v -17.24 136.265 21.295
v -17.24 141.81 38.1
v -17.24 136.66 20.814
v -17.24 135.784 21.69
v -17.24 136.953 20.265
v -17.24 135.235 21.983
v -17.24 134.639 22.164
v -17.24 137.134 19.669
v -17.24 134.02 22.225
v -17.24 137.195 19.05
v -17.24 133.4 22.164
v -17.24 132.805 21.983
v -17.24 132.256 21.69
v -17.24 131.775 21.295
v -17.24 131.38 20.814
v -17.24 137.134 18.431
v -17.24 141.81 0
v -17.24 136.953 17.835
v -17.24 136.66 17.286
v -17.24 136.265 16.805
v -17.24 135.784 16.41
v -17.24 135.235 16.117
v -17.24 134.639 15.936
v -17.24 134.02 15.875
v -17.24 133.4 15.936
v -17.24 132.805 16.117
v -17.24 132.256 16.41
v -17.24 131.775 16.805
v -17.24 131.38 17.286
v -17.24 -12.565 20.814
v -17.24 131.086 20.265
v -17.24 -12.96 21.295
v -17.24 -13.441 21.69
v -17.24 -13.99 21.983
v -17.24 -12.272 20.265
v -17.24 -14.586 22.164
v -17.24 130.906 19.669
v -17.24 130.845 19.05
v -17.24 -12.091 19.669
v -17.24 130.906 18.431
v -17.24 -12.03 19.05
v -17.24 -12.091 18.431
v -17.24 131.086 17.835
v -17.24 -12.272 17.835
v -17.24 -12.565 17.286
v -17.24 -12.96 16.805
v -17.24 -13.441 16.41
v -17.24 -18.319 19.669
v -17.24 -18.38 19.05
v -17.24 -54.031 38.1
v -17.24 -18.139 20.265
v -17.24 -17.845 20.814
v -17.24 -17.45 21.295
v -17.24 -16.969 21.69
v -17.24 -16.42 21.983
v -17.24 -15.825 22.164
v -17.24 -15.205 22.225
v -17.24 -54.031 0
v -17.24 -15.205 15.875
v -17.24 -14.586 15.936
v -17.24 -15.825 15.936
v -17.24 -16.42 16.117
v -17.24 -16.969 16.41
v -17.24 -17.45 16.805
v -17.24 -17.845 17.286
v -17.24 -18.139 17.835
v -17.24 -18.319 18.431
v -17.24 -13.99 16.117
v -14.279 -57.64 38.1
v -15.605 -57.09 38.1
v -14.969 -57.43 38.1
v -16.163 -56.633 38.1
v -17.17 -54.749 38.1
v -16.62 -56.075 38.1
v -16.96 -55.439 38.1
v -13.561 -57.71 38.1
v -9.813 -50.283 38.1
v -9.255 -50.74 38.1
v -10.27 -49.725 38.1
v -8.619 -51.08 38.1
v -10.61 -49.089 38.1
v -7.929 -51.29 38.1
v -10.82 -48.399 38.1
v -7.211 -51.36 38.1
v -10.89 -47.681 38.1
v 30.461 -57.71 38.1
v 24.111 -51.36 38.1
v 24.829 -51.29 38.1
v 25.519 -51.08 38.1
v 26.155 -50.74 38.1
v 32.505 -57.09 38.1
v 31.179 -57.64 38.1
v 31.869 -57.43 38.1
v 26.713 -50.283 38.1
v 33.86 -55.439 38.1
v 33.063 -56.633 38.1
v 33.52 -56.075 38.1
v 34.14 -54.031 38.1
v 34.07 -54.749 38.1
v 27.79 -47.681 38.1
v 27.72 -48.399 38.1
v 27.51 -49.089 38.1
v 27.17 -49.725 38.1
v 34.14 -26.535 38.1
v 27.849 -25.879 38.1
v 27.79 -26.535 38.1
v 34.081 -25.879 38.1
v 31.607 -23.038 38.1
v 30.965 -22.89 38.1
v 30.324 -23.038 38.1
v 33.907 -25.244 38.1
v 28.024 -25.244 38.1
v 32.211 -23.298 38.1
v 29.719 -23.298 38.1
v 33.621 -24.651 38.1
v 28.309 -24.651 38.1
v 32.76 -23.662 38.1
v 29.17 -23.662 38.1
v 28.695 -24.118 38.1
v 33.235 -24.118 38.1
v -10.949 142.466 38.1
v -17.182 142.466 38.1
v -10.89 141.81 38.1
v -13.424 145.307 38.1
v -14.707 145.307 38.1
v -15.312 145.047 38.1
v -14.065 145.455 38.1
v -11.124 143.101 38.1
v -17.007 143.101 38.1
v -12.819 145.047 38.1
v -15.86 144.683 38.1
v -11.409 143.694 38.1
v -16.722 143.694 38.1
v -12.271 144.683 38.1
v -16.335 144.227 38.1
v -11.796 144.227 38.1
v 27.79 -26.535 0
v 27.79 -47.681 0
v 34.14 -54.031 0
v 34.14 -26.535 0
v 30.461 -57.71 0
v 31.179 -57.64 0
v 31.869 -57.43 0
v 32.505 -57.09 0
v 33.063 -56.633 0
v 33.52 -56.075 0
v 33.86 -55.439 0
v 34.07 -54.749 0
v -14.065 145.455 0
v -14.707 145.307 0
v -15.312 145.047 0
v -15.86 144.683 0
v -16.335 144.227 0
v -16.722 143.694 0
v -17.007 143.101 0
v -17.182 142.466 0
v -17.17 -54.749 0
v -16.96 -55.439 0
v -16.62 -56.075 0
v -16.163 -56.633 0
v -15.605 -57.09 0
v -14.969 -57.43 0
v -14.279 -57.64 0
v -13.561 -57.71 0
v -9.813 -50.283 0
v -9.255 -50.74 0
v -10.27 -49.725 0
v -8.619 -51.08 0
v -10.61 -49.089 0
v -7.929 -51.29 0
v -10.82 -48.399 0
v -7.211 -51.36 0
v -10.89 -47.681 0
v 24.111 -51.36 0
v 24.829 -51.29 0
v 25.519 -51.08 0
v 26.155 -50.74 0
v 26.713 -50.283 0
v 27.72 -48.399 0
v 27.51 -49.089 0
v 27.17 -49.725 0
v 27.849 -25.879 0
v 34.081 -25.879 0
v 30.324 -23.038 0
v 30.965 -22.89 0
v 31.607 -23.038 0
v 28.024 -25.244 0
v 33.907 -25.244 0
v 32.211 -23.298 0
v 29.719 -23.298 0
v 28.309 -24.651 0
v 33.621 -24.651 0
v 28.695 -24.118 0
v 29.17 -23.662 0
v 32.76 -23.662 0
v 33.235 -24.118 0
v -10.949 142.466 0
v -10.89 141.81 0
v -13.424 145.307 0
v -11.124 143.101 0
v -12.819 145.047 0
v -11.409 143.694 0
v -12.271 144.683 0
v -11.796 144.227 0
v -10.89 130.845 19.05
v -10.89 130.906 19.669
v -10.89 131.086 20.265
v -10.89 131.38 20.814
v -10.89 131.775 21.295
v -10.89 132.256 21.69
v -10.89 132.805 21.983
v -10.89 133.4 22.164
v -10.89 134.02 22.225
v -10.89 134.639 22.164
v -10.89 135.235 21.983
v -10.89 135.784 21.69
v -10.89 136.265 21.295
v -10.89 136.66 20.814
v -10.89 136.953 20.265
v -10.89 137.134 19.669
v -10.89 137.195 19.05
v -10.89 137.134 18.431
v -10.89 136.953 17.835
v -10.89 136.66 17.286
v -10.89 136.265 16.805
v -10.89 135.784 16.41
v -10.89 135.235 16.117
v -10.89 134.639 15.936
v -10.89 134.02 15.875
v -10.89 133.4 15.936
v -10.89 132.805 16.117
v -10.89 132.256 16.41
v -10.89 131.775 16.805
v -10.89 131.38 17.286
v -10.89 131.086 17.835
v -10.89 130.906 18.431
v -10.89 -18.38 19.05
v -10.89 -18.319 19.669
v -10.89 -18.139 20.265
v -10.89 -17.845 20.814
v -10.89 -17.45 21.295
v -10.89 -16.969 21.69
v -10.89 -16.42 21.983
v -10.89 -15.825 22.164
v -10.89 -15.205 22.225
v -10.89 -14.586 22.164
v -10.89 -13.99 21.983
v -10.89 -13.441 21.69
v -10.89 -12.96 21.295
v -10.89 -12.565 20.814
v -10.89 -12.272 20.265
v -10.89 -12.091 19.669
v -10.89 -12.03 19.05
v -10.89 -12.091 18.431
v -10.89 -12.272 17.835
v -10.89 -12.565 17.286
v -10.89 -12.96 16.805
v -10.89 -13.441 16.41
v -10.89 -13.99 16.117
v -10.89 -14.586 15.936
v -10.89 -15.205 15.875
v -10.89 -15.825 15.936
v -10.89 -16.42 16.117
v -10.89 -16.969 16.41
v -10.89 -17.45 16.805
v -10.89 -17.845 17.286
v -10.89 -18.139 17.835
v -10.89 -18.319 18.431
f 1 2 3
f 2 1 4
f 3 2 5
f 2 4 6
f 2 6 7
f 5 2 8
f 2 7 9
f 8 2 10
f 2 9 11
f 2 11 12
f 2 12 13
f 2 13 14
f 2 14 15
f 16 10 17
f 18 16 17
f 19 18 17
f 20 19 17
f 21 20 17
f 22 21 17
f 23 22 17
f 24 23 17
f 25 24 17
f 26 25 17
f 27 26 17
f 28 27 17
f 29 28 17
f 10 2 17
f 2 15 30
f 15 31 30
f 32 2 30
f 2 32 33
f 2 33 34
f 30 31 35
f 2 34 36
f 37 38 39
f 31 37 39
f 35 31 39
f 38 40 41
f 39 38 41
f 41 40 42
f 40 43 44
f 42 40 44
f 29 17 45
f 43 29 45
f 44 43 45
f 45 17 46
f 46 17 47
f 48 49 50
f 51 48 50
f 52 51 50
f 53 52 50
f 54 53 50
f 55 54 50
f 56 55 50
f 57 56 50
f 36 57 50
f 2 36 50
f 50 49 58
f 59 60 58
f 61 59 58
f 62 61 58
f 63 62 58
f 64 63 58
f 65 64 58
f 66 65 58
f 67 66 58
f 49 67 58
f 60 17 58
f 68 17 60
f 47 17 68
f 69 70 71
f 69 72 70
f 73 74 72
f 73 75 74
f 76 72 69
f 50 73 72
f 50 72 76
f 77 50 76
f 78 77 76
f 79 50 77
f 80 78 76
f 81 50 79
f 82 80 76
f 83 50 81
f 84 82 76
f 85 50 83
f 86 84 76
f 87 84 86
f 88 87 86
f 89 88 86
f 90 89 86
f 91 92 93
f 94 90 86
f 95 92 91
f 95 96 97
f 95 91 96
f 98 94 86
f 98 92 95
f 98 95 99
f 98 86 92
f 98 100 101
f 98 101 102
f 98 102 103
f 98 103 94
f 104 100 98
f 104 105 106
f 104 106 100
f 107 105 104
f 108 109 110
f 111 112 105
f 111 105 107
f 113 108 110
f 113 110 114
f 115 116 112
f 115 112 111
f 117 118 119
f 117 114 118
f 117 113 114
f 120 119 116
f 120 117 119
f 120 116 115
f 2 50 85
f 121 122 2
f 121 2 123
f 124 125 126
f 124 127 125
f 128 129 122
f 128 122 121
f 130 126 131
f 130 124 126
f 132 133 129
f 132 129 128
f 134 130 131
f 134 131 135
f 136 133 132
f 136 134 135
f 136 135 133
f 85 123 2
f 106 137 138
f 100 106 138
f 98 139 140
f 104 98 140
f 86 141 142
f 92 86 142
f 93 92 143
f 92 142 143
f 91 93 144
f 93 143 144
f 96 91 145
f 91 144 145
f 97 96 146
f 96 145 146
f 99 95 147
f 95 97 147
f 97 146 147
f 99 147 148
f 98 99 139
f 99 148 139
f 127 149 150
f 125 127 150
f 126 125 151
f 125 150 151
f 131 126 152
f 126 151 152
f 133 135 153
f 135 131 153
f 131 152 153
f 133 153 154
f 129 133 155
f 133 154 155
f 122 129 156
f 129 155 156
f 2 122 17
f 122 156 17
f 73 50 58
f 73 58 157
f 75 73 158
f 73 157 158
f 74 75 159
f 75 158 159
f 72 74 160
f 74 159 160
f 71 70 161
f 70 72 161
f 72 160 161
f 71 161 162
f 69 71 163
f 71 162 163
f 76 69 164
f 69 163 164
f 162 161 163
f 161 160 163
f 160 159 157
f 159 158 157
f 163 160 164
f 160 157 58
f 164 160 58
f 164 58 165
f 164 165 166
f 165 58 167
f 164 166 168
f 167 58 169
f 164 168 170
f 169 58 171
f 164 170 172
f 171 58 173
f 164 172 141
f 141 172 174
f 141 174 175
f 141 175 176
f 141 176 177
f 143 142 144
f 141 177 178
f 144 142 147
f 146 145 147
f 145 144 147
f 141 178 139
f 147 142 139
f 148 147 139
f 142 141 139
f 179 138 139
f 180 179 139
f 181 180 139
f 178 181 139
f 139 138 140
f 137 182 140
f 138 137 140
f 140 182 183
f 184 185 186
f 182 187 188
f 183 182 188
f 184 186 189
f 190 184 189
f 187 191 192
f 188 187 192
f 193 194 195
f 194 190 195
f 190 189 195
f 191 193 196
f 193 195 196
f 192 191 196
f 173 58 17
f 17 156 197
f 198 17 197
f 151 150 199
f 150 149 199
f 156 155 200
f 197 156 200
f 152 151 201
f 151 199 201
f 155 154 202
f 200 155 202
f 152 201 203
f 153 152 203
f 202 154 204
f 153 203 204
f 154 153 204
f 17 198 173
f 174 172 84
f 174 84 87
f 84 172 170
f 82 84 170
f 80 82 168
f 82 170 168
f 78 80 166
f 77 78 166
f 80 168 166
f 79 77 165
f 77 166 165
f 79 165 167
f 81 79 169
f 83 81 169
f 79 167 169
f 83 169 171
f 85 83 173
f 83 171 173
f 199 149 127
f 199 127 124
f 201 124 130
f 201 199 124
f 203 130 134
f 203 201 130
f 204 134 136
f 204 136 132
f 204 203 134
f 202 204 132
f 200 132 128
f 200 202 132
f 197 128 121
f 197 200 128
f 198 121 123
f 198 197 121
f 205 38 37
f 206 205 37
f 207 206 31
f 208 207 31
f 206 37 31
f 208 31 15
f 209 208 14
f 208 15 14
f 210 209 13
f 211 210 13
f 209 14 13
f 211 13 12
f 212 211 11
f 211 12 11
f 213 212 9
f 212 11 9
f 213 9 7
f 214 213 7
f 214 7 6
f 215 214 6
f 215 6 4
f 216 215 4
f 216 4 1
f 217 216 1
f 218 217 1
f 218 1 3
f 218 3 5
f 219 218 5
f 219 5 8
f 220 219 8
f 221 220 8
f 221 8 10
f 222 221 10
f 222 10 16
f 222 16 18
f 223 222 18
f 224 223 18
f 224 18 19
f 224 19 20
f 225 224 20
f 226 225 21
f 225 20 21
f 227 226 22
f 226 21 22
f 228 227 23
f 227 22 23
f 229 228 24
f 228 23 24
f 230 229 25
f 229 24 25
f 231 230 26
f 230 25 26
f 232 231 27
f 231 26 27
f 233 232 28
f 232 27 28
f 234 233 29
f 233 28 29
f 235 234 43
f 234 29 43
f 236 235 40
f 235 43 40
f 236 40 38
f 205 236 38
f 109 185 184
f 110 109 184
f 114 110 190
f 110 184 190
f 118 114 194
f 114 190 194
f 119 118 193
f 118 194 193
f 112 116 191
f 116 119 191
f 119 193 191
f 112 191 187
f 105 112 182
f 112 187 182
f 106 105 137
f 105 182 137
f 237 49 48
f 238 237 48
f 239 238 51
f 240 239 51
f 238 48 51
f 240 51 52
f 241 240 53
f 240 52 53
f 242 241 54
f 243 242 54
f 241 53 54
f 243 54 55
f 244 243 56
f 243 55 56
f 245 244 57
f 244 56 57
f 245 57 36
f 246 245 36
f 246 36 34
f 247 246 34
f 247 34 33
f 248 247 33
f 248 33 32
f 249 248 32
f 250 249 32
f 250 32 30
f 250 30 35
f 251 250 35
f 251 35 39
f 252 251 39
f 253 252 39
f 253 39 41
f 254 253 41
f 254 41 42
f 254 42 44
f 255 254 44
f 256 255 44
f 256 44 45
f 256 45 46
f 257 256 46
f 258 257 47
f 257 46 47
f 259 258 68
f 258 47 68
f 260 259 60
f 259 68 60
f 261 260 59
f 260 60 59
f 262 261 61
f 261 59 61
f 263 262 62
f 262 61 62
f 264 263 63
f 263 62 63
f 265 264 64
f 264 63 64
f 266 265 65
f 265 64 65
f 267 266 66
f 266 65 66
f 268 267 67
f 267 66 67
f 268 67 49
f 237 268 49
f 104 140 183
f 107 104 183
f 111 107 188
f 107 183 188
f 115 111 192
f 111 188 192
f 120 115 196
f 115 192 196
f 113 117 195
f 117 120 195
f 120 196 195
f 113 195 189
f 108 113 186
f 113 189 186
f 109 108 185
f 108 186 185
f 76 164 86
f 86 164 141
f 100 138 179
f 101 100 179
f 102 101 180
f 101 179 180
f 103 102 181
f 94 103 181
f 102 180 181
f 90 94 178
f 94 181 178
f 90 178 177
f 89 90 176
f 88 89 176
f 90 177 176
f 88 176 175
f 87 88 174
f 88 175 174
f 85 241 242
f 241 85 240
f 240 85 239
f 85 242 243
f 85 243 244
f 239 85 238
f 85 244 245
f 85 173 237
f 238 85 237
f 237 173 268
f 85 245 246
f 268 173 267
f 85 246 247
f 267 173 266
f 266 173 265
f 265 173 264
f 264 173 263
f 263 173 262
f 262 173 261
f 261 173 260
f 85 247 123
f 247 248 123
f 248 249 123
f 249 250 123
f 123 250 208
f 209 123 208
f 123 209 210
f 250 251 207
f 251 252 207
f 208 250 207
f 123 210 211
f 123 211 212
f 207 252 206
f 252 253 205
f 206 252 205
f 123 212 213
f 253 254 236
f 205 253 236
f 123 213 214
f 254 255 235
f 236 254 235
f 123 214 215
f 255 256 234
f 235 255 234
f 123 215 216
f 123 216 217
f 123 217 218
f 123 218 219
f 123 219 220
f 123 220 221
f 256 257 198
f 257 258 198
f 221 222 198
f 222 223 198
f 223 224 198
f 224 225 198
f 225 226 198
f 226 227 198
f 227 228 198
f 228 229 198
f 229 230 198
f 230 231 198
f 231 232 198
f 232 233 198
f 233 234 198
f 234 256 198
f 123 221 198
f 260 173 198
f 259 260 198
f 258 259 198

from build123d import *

# Parameters (mm, degrees)
F0_W        = 38.6806862377
F0_H        = 6.35
F1_DEPTH    = 38.1
F2_T1_DEPTH = 38.1
F2_T3_DEPTH = 56.4963073453
F3_R        = 3.175
F4_DEPTH    = 25.4


# Not quite as in the source:
# - a fillet or chamfer that OpenCascade refuses, or shapes differently, is made with other operations: its cross-section is extruded or revolved along the edge and cut away or added


with BuildPart() as f1:
    # F0 (on Top) → F1 (new body)
    with BuildSketch(Plane.XY):
        Polygon((-10.8904888918, 145.4896045446), (-17.2404888918, 145.4896045446), (-17.2404888918, -57.7103954554), (-10.8904888918, -57.7103954554), (-10.8904888918, -51.3603954554), align=None)
        with Locations((8.449854227, -54.5353954554)):
            Rectangle(F0_W, F0_H)
        Polygon((27.7901973458, -22.8552754367), (27.7901973458, -51.3603954554), (27.7901973458, -57.7103954554), (34.1401973458, -57.7103954554), (34.1401973458, -22.8552754367), align=None)
    extrude(amount=F1_DEPTH)

    # F2: fillet of radius 3.6792614691 on 8 edges, made by hand

    # F2_s2 → F2_t1 (join)
    with BuildSketch(Plane.XY):
        with BuildLine():
            ThreePointArc((-7.2112274228, -51.3603954554), (-9.8128581573, -50.2827647208), (-10.8904888918, -47.6811339863))
            Line((-10.8904888918, -47.6811339863), (-10.8904888918, -51.3603954554))
            Line((-10.8904888918, -51.3603954554), (-7.2112274228, -51.3603954554))
        make_face()
        with BuildLine():
            ThreePointArc((27.7901973458, -47.6811339863), (26.7125666113, -50.2827647208), (24.1109358768, -51.3603954554))
            Line((24.1109358768, -51.3603954554), (27.7901973458, -51.3603954554))
            Line((27.7901973458, -51.3603954554), (27.7901973458, -47.6811339863))
        make_face()
    extrude(amount=F2_T1_DEPTH)

    # F2_s4 → F2_t3 (cut)
    with BuildSketch(Plane.XY.offset(-9.1981536726)):
        with BuildLine():
            ThreePointArc((31.4694588149, -22.8552754367), (28.8678280803, -23.9329061712), (27.7901973458, -26.5345369057))
            Line((27.7901973458, -26.5345369057), (27.7901973458, -22.8552754367))
            Line((27.7901973458, -22.8552754367), (31.4694588149, -22.8552754367))
        make_face()
        with BuildLine():
            ThreePointArc((34.1401973458, -26.5345369057), (33.0625666113, -23.9329061712), (30.4609358768, -22.8552754367))
            Line((30.4609358768, -22.8552754367), (34.1401973458, -22.8552754367))
            Line((34.1401973458, -22.8552754367), (34.1401973458, -26.5345369057))
        make_face()
        with BuildLine():
            ThreePointArc((-17.2404888918, -54.0311339863), (-16.1628581573, -56.6327647208), (-13.5612274228, -57.7103954554))
            Line((-13.5612274228, -57.7103954554), (-17.2404888918, -57.7103954554))
            Line((-17.2404888918, -57.7103954554), (-17.2404888918, -54.0311339863))
        make_face()
        with BuildLine():
            ThreePointArc((30.4609358768, -57.7103954554), (33.0625666113, -56.6327647208), (34.1401973458, -54.0311339863))
            Line((34.1401973458, -54.0311339863), (34.1401973458, -57.7103954554))
            Line((34.1401973458, -57.7103954554), (30.4609358768, -57.7103954554))
        make_face()
        with BuildLine():
            ThreePointArc((-14.5697503609, 145.4896045446), (-11.9681196264, 144.4119738101), (-10.8904888918, 141.8103430756))
            Line((-10.8904888918, 141.8103430756), (-10.8904888918, 145.4896045446))
            Line((-10.8904888918, 145.4896045446), (-14.5697503609, 145.4896045446))
        make_face()
        with BuildLine():
            ThreePointArc((-13.5612274228, 145.4896045446), (-16.1628581573, 144.4119738101), (-17.2404888918, 141.8103430756))
            Line((-17.2404888918, 141.8103430756), (-17.2404888918, 145.4896045446))
            Line((-17.2404888918, 145.4896045446), (-13.5612274228, 145.4896045446))
        make_face()
    extrude(amount=F2_T3_DEPTH, mode=Mode.SUBTRACT)

    # F3 (on face) → F4 (cut)
    with BuildSketch(Plane(origin=(-17.2404888918, 0, 0), x_dir=(0, -1, 0), z_dir=(-1, 0, 0))):
        with Locations((-134.0196450753, 19.05)):
            Circle(F3_R)
        with Locations((15.2053549247, 19.05)):
            Circle(F3_R)
    extrude(amount=-F4_DEPTH, mode=Mode.SUBTRACT)


solid = f1.part
